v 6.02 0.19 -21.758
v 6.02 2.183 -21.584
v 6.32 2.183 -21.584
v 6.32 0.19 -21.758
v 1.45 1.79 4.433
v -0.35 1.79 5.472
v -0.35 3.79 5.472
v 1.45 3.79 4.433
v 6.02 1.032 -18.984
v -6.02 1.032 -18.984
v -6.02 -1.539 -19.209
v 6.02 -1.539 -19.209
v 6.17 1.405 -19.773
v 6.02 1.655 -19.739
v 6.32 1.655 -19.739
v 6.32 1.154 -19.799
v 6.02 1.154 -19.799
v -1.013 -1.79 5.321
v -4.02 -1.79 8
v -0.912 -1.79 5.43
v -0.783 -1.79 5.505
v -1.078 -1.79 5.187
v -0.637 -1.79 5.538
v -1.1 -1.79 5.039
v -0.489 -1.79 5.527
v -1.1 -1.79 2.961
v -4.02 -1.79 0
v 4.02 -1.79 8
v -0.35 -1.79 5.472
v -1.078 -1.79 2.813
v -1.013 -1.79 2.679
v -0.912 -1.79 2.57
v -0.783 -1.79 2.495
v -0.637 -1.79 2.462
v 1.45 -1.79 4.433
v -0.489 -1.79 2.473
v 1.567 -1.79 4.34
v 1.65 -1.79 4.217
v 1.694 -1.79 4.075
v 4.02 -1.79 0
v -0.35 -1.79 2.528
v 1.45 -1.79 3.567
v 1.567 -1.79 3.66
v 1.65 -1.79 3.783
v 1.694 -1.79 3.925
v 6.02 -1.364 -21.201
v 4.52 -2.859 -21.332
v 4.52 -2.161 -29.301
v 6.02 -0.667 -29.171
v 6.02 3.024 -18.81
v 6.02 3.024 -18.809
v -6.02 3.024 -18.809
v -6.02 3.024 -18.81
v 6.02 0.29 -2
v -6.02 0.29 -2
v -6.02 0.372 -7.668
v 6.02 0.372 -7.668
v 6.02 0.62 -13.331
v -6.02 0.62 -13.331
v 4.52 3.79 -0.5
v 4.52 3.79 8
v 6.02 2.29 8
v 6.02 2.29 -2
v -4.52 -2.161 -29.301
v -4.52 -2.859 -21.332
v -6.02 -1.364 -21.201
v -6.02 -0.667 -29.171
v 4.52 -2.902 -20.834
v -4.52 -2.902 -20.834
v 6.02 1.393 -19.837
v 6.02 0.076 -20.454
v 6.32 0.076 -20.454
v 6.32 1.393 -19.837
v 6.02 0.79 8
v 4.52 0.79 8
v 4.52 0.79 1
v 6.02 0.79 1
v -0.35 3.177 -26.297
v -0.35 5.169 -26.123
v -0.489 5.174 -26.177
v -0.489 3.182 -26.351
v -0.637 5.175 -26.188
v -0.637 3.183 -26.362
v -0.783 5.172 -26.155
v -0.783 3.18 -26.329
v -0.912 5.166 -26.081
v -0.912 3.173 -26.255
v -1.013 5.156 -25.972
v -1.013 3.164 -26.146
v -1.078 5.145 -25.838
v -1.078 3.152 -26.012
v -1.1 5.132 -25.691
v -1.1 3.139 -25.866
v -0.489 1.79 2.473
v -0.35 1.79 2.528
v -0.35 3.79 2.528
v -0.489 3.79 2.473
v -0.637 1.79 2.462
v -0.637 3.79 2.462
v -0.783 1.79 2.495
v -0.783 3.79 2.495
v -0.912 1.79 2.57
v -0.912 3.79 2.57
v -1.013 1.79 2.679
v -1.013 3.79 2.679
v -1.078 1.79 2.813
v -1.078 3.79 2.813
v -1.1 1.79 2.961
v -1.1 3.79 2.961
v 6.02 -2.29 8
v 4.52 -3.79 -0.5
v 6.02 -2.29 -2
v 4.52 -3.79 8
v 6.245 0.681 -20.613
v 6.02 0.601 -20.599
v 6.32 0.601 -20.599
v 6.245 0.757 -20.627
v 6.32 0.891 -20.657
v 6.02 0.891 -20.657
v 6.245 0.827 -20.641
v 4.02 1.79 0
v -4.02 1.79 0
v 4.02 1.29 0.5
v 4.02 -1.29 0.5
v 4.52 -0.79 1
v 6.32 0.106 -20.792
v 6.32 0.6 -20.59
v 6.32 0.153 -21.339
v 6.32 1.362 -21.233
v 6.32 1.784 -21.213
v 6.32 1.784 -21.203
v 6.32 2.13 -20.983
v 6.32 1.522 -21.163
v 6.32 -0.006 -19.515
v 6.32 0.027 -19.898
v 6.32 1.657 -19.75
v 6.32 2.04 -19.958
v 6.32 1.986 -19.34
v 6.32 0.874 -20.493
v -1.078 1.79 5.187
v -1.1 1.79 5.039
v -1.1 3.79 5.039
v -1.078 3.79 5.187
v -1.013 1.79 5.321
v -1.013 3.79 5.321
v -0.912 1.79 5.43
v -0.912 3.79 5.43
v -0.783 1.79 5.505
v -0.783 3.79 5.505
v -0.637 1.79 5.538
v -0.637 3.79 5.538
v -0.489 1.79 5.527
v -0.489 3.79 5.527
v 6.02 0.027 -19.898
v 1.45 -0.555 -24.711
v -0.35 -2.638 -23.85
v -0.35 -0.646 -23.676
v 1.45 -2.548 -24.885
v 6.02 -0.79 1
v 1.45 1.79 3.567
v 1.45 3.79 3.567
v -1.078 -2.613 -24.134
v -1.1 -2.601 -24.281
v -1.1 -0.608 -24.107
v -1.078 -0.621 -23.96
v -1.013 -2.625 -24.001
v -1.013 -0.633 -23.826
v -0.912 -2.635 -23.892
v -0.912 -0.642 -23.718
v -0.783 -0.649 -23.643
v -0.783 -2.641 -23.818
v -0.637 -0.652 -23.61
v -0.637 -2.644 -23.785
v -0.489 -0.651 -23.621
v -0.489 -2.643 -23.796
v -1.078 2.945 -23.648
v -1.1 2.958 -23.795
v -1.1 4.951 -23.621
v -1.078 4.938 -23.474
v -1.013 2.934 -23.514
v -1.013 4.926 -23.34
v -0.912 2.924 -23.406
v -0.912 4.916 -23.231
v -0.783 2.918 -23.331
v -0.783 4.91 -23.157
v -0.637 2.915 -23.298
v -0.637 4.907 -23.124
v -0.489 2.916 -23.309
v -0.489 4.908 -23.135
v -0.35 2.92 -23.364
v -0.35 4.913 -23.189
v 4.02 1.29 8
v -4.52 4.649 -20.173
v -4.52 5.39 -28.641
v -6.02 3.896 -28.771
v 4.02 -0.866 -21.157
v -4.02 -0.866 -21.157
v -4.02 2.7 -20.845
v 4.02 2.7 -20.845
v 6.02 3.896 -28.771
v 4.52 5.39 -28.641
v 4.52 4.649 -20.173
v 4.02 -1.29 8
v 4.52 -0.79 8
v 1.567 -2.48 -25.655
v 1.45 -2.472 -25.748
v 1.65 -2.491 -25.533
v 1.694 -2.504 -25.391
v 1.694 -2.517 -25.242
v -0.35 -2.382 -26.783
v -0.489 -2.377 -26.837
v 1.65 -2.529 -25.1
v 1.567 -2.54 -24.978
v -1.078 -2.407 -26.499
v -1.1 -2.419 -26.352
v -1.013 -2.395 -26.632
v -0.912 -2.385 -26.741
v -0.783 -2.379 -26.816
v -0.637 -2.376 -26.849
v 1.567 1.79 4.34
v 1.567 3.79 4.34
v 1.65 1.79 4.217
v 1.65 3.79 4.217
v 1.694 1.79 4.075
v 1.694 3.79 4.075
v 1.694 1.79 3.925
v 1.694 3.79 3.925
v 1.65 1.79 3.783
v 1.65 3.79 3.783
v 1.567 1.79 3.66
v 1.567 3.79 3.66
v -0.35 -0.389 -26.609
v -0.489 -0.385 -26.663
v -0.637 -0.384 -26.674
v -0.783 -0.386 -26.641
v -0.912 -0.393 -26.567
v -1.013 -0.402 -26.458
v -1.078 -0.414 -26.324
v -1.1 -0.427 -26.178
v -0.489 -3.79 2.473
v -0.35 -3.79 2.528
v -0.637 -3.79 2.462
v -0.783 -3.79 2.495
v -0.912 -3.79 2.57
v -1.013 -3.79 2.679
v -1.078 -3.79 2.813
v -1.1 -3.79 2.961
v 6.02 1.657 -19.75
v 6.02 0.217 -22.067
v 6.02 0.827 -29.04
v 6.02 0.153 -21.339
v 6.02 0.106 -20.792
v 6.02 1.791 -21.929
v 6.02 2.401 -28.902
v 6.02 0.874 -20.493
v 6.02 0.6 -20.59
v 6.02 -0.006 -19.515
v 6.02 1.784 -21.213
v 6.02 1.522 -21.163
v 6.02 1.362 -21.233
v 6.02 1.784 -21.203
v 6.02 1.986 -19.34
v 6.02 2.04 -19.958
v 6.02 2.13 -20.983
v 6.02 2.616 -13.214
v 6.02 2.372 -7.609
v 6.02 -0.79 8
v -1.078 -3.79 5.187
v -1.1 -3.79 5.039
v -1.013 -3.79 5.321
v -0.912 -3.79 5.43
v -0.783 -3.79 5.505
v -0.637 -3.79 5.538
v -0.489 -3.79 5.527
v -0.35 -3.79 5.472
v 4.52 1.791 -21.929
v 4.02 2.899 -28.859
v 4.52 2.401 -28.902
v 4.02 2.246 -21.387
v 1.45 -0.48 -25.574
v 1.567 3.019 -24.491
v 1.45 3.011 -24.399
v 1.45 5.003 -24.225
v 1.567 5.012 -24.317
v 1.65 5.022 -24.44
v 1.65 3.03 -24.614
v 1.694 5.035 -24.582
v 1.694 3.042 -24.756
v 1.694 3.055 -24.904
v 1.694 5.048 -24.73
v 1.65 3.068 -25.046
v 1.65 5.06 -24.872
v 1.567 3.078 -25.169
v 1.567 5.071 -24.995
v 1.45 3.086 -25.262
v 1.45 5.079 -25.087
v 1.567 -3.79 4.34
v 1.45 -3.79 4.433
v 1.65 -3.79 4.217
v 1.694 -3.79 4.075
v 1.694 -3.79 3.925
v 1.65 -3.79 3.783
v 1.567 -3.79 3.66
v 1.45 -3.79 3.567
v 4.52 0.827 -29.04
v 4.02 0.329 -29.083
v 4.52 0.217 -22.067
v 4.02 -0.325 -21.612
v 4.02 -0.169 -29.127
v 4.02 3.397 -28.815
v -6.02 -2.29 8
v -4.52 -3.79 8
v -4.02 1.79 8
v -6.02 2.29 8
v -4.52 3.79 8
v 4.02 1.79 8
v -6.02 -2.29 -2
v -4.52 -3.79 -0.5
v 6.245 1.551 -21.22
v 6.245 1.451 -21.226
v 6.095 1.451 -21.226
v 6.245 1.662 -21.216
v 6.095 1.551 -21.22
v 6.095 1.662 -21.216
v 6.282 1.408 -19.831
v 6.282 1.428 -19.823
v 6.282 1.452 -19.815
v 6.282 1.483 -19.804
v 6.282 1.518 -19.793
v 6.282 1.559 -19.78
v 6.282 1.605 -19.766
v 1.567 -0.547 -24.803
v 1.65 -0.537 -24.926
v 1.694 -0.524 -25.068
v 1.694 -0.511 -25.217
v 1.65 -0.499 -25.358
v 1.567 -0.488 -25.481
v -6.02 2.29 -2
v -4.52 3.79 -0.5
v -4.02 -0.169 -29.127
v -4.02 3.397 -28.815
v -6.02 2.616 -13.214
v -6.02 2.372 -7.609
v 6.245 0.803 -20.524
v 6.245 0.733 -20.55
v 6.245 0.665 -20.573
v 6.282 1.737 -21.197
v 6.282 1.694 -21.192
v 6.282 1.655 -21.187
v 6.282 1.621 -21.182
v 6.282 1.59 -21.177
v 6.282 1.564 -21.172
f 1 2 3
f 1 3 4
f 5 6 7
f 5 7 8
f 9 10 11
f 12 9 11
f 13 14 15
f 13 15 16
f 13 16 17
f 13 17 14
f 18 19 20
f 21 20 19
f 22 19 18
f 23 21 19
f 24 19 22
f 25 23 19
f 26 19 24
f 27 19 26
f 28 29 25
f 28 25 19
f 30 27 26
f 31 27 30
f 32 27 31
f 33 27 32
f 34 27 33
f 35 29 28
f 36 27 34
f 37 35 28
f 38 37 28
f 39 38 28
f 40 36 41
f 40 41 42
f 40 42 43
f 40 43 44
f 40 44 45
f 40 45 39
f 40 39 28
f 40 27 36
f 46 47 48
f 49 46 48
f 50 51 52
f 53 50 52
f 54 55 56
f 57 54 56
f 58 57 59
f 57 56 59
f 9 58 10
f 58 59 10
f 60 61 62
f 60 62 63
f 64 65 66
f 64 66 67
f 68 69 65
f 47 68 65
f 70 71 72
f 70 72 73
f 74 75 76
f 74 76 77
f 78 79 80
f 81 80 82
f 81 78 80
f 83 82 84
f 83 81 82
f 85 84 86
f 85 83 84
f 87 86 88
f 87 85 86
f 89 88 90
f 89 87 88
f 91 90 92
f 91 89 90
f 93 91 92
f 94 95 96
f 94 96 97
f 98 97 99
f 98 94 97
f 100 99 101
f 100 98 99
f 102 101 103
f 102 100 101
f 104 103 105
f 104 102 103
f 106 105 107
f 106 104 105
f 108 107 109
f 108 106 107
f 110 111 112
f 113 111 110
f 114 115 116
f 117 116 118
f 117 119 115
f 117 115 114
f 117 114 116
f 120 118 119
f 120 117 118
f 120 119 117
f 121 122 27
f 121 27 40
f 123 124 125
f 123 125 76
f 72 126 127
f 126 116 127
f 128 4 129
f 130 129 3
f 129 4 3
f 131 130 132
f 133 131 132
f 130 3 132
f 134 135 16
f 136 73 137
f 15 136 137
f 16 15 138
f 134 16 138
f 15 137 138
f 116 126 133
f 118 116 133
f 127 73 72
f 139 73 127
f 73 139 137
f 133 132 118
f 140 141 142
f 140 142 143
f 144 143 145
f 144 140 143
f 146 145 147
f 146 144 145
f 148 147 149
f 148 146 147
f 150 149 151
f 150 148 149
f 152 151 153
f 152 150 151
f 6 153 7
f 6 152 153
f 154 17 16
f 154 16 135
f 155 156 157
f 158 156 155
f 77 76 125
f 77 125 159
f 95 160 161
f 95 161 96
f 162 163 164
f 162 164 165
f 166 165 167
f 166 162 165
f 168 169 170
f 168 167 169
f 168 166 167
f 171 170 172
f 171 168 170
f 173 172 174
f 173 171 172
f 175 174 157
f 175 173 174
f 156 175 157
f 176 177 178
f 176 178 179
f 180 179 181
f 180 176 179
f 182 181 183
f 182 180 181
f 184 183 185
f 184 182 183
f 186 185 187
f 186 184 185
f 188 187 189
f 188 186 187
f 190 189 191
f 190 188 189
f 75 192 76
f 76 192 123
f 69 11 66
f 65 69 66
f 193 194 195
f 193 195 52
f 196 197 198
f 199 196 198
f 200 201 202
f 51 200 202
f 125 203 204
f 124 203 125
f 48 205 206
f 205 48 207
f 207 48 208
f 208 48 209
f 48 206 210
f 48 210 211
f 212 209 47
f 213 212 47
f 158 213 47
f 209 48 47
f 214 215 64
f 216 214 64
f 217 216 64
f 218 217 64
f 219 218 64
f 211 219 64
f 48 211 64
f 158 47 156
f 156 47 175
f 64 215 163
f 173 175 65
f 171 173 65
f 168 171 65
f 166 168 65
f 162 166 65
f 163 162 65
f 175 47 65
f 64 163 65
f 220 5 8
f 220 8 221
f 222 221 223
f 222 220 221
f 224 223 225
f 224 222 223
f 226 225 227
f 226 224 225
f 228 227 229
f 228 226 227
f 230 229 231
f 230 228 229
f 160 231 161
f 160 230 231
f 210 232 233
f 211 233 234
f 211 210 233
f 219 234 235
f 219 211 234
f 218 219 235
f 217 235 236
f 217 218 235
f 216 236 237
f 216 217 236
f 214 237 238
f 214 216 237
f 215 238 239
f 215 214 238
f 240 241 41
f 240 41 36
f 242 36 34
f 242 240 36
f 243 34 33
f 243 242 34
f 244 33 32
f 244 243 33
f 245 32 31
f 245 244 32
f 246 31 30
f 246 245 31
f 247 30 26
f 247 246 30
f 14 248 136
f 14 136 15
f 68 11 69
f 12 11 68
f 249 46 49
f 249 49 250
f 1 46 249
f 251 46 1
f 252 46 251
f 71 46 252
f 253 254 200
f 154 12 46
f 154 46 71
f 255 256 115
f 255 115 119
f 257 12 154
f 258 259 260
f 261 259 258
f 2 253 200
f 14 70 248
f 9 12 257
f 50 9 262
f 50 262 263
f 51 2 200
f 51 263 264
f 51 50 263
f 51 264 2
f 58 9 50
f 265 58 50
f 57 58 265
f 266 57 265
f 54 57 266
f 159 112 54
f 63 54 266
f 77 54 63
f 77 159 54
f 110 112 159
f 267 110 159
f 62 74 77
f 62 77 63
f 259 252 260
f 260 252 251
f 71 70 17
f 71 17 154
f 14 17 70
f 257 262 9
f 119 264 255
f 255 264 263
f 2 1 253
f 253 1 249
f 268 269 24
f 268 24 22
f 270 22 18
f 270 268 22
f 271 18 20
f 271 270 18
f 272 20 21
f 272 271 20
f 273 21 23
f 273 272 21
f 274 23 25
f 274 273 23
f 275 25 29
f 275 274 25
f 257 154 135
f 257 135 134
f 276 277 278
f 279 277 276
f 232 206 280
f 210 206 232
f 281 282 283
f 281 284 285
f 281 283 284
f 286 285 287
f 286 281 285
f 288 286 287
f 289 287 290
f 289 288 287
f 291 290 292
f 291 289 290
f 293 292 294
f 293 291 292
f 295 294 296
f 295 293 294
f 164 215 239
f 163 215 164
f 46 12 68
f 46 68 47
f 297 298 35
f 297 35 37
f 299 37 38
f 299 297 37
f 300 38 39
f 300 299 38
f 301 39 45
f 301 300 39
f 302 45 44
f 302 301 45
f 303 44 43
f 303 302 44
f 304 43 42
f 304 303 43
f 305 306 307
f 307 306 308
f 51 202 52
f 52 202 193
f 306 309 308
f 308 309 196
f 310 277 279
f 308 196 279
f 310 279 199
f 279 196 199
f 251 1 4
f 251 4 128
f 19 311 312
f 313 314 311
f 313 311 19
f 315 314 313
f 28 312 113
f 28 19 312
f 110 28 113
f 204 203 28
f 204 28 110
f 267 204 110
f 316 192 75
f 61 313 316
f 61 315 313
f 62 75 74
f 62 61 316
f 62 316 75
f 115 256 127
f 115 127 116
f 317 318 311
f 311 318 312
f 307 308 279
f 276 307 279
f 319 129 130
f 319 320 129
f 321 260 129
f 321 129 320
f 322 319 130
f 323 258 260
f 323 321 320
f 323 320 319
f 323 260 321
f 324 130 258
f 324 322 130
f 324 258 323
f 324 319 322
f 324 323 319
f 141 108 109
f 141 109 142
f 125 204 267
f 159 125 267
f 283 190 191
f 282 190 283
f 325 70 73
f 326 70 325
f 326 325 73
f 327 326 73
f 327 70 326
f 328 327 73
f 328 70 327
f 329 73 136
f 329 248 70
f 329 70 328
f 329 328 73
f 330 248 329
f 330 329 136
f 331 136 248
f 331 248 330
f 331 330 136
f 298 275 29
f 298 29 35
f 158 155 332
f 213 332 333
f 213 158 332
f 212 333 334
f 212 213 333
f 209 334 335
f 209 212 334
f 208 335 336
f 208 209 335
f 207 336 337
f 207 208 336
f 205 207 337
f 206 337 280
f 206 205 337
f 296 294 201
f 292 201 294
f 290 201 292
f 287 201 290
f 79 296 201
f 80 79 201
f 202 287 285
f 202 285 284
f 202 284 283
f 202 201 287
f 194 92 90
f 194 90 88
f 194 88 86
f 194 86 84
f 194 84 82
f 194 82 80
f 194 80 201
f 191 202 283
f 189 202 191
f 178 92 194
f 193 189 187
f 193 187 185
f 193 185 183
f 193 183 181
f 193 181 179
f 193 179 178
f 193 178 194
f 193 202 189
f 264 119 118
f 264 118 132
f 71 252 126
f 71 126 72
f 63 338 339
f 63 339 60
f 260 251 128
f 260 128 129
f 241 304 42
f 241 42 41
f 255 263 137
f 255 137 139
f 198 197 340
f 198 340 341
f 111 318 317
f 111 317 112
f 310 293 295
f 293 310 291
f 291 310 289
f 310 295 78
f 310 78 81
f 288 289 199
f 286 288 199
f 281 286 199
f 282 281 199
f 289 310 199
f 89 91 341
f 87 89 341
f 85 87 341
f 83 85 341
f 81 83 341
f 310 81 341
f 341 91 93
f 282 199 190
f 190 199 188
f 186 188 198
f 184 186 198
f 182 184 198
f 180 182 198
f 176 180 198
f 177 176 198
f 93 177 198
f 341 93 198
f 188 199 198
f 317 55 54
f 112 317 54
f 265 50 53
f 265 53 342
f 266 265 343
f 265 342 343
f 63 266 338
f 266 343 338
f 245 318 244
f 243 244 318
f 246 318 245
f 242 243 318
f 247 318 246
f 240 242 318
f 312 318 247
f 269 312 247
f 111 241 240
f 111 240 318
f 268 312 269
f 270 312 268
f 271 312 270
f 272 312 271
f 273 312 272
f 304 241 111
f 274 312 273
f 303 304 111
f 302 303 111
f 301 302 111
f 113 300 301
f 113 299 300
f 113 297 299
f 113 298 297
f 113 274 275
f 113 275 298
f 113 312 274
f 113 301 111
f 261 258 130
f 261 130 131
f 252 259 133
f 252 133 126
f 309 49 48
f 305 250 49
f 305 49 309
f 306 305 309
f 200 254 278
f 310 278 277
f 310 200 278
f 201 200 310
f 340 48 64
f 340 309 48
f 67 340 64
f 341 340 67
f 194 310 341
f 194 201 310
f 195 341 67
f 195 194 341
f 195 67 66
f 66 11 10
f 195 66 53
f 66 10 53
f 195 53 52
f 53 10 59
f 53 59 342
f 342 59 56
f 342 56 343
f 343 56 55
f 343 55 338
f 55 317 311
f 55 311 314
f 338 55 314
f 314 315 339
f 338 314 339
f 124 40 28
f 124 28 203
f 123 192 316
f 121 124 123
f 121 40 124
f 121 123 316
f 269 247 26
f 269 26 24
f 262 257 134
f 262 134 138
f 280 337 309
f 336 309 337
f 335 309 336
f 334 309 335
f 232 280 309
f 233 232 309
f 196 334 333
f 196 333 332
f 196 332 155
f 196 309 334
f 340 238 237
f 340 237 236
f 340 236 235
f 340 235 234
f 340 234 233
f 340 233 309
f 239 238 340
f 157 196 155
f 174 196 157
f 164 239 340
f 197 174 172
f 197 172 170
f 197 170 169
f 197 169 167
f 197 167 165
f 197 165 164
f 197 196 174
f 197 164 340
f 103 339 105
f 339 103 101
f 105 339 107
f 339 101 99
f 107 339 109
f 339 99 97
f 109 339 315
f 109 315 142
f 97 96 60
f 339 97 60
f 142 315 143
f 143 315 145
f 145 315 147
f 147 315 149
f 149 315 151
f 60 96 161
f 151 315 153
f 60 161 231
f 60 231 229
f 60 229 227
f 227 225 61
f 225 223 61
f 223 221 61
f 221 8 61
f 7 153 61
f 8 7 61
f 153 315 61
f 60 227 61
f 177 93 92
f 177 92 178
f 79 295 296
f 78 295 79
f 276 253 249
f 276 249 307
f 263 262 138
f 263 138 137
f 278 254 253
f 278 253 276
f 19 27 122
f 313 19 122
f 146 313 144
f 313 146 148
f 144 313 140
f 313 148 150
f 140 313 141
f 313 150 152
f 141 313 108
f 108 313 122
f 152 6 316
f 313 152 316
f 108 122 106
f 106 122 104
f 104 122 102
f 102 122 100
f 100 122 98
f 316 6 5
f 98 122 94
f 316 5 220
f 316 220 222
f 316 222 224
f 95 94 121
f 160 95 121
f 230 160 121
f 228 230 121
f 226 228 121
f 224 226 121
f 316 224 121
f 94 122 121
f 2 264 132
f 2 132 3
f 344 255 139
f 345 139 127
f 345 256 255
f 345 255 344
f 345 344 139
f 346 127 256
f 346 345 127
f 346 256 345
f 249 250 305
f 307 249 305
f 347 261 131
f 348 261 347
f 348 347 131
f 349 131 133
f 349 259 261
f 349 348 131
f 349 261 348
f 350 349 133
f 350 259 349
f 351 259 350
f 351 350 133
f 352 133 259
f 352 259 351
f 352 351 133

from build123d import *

# Parameters (mm, degrees)
SKETCH1_W               = 12.04
SKETCH1_H               = 7.58
SKETCH1_W_2             = 8.04
SKETCH1_H_2             = 3.58
BOSS_EXTRUDE1_DEPTH     = 8
SKETCH1_2_W             = 12.04
SKETCH1_2_H             = 7.58
SKETCH1_2_W_2           = 8.04
SKETCH1_2_H_2           = 3.58
BOSS_EXTRUDE2_DEPTH     = 2
EXTRUDE_THIN1_START     = -12.04
EXTRUDE_THIN1_DEPTH     = 12.04
SKETCH5_W               = 12.04
SKETCH5_H               = 7.58
SKETCH5_W_2             = 8.04
SKETCH5_H_2             = 3.58
BOSS_EXTRUDE4_DEPTH     = 10
SKETCH5_4_W             = 12.04
SKETCH5_4_H             = 7.58
BOSS_EXTRUDE5_DEPTH     = 2
CHAMFER1_SIZE           = 1.5
CUT_EXTRUDE1_DEPTH      = 31.858817668
CUT_EXTRUDE1_DEPTH_BACK = 31.858817668
CUT_EXTRUDE2_DEPTH      = 31.883619629
CUT_EXTRUDE2_DEPTH_BACK = 31.883619629
SKETCH8_W               = 4
SKETCH8_H               = 1.58
CUT_EXTRUDE3_DEPTH      = 7
SKETCH9_W               = 4
SKETCH9_H               = 1.58
CUT_EXTRUDE4_DEPTH      = 7
CHAMFER2_SIZE           = 0.5
BOSS_EXTRUDE6_DEPTH     = 0.3


with BuildPart() as part:
    # Sketch1 → Boss-Extrude1 (new body)
    with BuildSketch(Plane.XY):
        Rectangle(SKETCH1_W, SKETCH1_H)
        Rectangle(SKETCH1_W_2, SKETCH1_H_2, mode=Mode.SUBTRACT)
    extrude(amount=BOSS_EXTRUDE1_DEPTH)

    # Sketch1<2> → Boss-Extrude2 (add)
    # profile 1 of 2: a face of its own
    with BuildSketch(Plane.XY):
        Rectangle(SKETCH1_2_W, SKETCH1_2_H)
        Rectangle(SKETCH1_2_W_2, SKETCH1_2_H_2, mode=Mode.SUBTRACT)
    # profile 2 of 2: a face of its own
    with BuildSketch(Plane.XY):
        Rectangle(SKETCH1_2_W_2, SKETCH1_2_H_2)
    extrude(amount=-BOSS_EXTRUDE2_DEPTH)

    # Sketch3 → Extrude-Thin1 (add)
    with BuildSketch(Plane(origin=(6.02, 9.81, 0), x_dir=(0, -1, 0), z_dir=(1, 0, 0)).offset(EXTRUDE_THIN1_START)):
        with BuildLine():
            Line((13.6, 2), (9.52, 2))
            ThreePointArc((9.52, 2), (9.33452957, 10.5), (8.778471331, 18.983819807))
            Line((8.778471331, 18.983819807), (12.842945699, 19.339415237))
            Line((12.842945699, 19.339415237), (12.668634214, 21.331804633))
            Line((12.668634214, 21.331804633), (6.601440048, 20.800993925))
            ThreePointArc((6.601440048, 20.800993925), (7.336433126, 10.412761225), (7.509629919, 0))
            Line((7.509629919, 0), (13.6, 0))
            Line((13.6, 0), (13.6, 2))
        make_face()
    extrude(amount=EXTRUDE_THIN1_DEPTH)

    # Sketch5 → Boss-Extrude4 (add)
    with BuildSketch(Plane(origin=(0, -2.094837633, -19.257341416), x_dir=(-1, 0, 0), z_dir=(0, 0.08715574274765182, -0.9961946980917462))):
        with Locations((0, 2.848308513)):
            Rectangle(SKETCH5_W, SKETCH5_H)
        with Locations((0, 2.848308513)):
            Rectangle(SKETCH5_W_2, SKETCH5_H_2, mode=Mode.SUBTRACT)
    extrude(amount=BOSS_EXTRUDE4_DEPTH)

    # Sketch5<4> → Boss-Extrude5 (add)
    with BuildSketch(Plane(origin=(0, -2.094837633, -19.257341416), x_dir=(-1, 0, 0), z_dir=(0, 0.08715574274765182, -0.9961946980917462))):
        with Locations((0, 2.848308513)):
            Rectangle(SKETCH5_4_W, SKETCH5_4_H)
    extrude(amount=BOSS_EXTRUDE5_DEPTH)

    # Chamfer1
    chamfer1_edges = [part.edges().sort_by_distance(p)[0] for p in [
        (0, -3.79, -2),
        (0, 3.79, -2),
        (-6.02, -2.597166986, -24.320388728),
        (6.02, -2.597166986, -24.320388728),
        (0, -3.032945699, -19.339415237),
        (6.02, -3.79, 3),
        (-6.02, -3.79, 3),
        (-6.02, 3.79, 3),
        (6.02, 3.79, 3),
        (0, 4.518210112, -18.678774707),
        (6.02, 4.953988826, -23.659748198),
        (-6.02, 4.953988826, -23.659748198),
    ]]
    chamfer(chamfer1_edges, length=CHAMFER1_SIZE - 0.0001)  # a hair under: the kernel refuses the full size

    # Sketch6 → Cut-Extrude1 (cut, two sides: drawn at the far end of the back side and taken through both)
    with BuildSketch(Plane(origin=(0, 3.79, 0), x_dir=(1, 0, 0), z_dir=(0, 1, 0)).offset(-CUT_EXTRUDE1_DEPTH_BACK)):
        with BuildLine():
            Line((1.45, -3.566987298), (-0.35, -2.527756814))
            ThreePointArc((-0.35, -2.527756814), (-0.85, -2.527756814), (-1.1, -2.960769515))
            Line((-1.1, -2.960769515), (-1.1, -5.039230485))
            ThreePointArc((-1.1, -5.039230485), (-0.85, -5.472243186), (-0.35, -5.472243186))
            Line((-0.35, -5.472243186), (1.45, -4.433012702))
            ThreePointArc((1.45, -4.433012702), (1.7, -4), (1.45, -3.566987298))
        make_face()
    extrude(amount=CUT_EXTRUDE1_DEPTH + CUT_EXTRUDE1_DEPTH_BACK, mode=Mode.SUBTRACT)

    # Sketch7 → Cut-Extrude2 (cut, two sides: drawn at the far end of the back side and taken through both)
    with BuildSketch(Plane(origin=(0, 2.862121636, 0.250403197), x_dir=(1, 0, 0), z_dir=(0, 0.9961946980917462, 0.08715574274765181)).offset(-CUT_EXTRUDE2_DEPTH_BACK)):
        with BuildLine():
            Line((1.45, 25.43449699), (-0.35, 26.473727475))
            ThreePointArc((-0.35, 26.473727475), (-0.85, 26.473727475), (-1.1, 26.040714773))
            Line((-1.1, 26.040714773), (-1.1, 23.962253804))
            ThreePointArc((-1.1, 23.962253804), (-0.85, 23.529241102), (-0.35, 23.529241102))
            Line((-0.35, 23.529241102), (1.45, 24.568471587))
            ThreePointArc((1.45, 24.568471587), (1.7, 25.001484288), (1.45, 25.43449699))
        make_face()
    extrude(amount=CUT_EXTRUDE2_DEPTH + CUT_EXTRUDE2_DEPTH_BACK, mode=Mode.SUBTRACT)

    # Sketch8 → Cut-Extrude3 (cut)
    with BuildSketch(Plane(origin=(0, 2.527645904, -28.891124885), x_dir=(-1, 0, 0), z_dir=(0, 0.08715574274765193, -0.9961946980917461))):
        with Locations((-6.02, -0.916945525)):
            Rectangle(SKETCH8_W, SKETCH8_H)
    extrude(amount=-CUT_EXTRUDE3_DEPTH, mode=Mode.SUBTRACT)

    # Sketch9 → Cut-Extrude4 (cut)
    with BuildSketch(Plane.XY.offset(8)):
        with Locations((6.02, 0)):
            Rectangle(SKETCH9_W, SKETCH9_H)
    extrude(amount=-CUT_EXTRUDE4_DEPTH, mode=Mode.SUBTRACT)

    # Chamfer2
    chamfer2_edges = [part.edges().sort_by_distance(p)[0] for p in [
        (4.02, 0.522150723, -25.553213547),
        (4.02, 1.004099435, -21.997679067),
        (4.02, 2.096138346, -25.415507473),
        (4.02, 0.79, 4.5),
        (4.02, 0, 1),
        (4.02, -0.79, 4.5),
    ]]
    chamfer(chamfer2_edges, length=CHAMFER2_SIZE)

    # Sketch10 → Boss-Extrude6 (add)
    with BuildSketch(Plane(origin=(6.02, 0, 0), x_dir=(0, 0, -1), z_dir=(1, 0, 0))):
        with BuildLine():
            Line((21.338592032, 0.15320422), (21.233028007, 1.362426781))
            add(Edge.make_bspline(
                [(21.233028007, 1.362426781), (21.230623172, 1.392016851), (21.22550753, 1.454961769), (21.219940858, 1.554962176), (21.215964545, 1.666017285), (21.21390718, 1.743649504), (21.212829837, 1.784301781)],
                knots=[0, 0, 0, 0, 0.843314449, 1.793924683, 2.844783983, 4, 4, 4, 4], degree=3))
            Line((21.212829837, 1.784301781), (21.202540203, 1.783539585))
            add(Edge.make_bspline(
                [(21.202540203, 1.783539585), (21.200808847, 1.76790896), (21.197498896, 1.738026826), (21.192026096, 1.695375149), (21.187181442, 1.656725646), (21.182258815, 1.622035938), (21.177293915, 1.591439333), (21.172767869, 1.564856175), (21.168316369, 1.542328609), (21.164861999, 1.528700708), (21.163287154, 1.522487756)],
                knots=[0, 0, 0, 0, 1.428769924, 2.731477, 3.906784307, 4.967723303, 5.914548028, 6.722864751, 7.417754754, 8, 8, 8, 8], degree=3))
            Line((21.163287154, 1.522487756), (20.792098129, 0.105567024))
            Line((20.792098129, 0.105567024), (20.453683495, 0.075841415))
            Line((20.453683495, 0.075841415), (19.837067642, 1.393295683))
            add(Edge.make_bspline(
                [(19.837067642, 1.393295683), (19.835006874, 1.398111338), (19.83016149, 1.409434157), (19.822671636, 1.429138703), (19.813894021, 1.454208796), (19.803667873, 1.484424749), (19.792311733, 1.520061222), (19.779237689, 1.560762892), (19.765280196, 1.6069604), (19.755390982, 1.639486413), (19.750177398, 1.656634098)],
                knots=[0, 0, 0, 0, 0.453127431, 1.065416844, 1.823166036, 2.751085321, 3.825012516, 5.058876589, 6.449442438, 8, 8, 8, 8], degree=3))
            Line((19.750177398, 1.656634098), (19.738744471, 1.655490805))
            add(Edge.make_bspline(
                [(19.738744471, 1.655490805), (19.751035456, 1.572245864), (19.77562146, 1.405728657), (19.791432277, 1.238150394), (19.799338983, 1.154347512)],
                knots=[0, 0, 0, 0, 0.999835902, 2, 2, 2, 2], degree=3))
            Line((19.799338983, 1.154347512), (19.898043251, 0.027442024))
            Line((19.898043251, 0.027442024), (19.514659105, -0.006094561))
            Line((19.514659105, -0.006094561), (19.34049752, 1.986283488))
            Line((19.34049752, 1.986283488), (19.957875568, 2.040018244))
            Line((19.957875568, 2.040018244), (20.492555446, 0.873859707))
            add(Edge.make_bspline(
                [(20.492555446, 0.873859707), (20.503235644, 0.85021375), (20.524164125, 0.803878095), (20.550400132, 0.734093054), (20.573588848, 0.666711186), (20.584949885, 0.621787137), (20.59049752, 0.599850561)],
                knots=[0, 0, 0, 0, 1.068017297, 2.092843245, 3.068728431, 4, 4, 4, 4], degree=3))
            Line((20.59049752, 0.599850561), (20.599262764, 0.600612756))
            add(Edge.make_bspline(
                [(20.599262764, 0.600612756), (20.603575304, 0.627567148), (20.611930591, 0.679789657), (20.62621702, 0.755074943), (20.640290752, 0.825113193), (20.651436457, 0.869577883), (20.656808495, 0.891009098)],
                knots=[0, 0, 0, 0, 1.106003676, 2.142815394, 3.104869014, 4, 4, 4, 4], degree=3))
            Line((20.656808495, 0.891009098), (20.983028007, 2.129957268))
            Line((20.983028007, 2.129957268), (21.583637764, 2.182548732))
            Line((21.583637764, 2.182548732), (21.757799349, 0.190170683))
            Line((21.757799349, 0.190170683), (21.338592032, 0.15320422))
        make_face()
    extrude(amount=BOSS_EXTRUDE6_DEPTH)


solid = part.part
